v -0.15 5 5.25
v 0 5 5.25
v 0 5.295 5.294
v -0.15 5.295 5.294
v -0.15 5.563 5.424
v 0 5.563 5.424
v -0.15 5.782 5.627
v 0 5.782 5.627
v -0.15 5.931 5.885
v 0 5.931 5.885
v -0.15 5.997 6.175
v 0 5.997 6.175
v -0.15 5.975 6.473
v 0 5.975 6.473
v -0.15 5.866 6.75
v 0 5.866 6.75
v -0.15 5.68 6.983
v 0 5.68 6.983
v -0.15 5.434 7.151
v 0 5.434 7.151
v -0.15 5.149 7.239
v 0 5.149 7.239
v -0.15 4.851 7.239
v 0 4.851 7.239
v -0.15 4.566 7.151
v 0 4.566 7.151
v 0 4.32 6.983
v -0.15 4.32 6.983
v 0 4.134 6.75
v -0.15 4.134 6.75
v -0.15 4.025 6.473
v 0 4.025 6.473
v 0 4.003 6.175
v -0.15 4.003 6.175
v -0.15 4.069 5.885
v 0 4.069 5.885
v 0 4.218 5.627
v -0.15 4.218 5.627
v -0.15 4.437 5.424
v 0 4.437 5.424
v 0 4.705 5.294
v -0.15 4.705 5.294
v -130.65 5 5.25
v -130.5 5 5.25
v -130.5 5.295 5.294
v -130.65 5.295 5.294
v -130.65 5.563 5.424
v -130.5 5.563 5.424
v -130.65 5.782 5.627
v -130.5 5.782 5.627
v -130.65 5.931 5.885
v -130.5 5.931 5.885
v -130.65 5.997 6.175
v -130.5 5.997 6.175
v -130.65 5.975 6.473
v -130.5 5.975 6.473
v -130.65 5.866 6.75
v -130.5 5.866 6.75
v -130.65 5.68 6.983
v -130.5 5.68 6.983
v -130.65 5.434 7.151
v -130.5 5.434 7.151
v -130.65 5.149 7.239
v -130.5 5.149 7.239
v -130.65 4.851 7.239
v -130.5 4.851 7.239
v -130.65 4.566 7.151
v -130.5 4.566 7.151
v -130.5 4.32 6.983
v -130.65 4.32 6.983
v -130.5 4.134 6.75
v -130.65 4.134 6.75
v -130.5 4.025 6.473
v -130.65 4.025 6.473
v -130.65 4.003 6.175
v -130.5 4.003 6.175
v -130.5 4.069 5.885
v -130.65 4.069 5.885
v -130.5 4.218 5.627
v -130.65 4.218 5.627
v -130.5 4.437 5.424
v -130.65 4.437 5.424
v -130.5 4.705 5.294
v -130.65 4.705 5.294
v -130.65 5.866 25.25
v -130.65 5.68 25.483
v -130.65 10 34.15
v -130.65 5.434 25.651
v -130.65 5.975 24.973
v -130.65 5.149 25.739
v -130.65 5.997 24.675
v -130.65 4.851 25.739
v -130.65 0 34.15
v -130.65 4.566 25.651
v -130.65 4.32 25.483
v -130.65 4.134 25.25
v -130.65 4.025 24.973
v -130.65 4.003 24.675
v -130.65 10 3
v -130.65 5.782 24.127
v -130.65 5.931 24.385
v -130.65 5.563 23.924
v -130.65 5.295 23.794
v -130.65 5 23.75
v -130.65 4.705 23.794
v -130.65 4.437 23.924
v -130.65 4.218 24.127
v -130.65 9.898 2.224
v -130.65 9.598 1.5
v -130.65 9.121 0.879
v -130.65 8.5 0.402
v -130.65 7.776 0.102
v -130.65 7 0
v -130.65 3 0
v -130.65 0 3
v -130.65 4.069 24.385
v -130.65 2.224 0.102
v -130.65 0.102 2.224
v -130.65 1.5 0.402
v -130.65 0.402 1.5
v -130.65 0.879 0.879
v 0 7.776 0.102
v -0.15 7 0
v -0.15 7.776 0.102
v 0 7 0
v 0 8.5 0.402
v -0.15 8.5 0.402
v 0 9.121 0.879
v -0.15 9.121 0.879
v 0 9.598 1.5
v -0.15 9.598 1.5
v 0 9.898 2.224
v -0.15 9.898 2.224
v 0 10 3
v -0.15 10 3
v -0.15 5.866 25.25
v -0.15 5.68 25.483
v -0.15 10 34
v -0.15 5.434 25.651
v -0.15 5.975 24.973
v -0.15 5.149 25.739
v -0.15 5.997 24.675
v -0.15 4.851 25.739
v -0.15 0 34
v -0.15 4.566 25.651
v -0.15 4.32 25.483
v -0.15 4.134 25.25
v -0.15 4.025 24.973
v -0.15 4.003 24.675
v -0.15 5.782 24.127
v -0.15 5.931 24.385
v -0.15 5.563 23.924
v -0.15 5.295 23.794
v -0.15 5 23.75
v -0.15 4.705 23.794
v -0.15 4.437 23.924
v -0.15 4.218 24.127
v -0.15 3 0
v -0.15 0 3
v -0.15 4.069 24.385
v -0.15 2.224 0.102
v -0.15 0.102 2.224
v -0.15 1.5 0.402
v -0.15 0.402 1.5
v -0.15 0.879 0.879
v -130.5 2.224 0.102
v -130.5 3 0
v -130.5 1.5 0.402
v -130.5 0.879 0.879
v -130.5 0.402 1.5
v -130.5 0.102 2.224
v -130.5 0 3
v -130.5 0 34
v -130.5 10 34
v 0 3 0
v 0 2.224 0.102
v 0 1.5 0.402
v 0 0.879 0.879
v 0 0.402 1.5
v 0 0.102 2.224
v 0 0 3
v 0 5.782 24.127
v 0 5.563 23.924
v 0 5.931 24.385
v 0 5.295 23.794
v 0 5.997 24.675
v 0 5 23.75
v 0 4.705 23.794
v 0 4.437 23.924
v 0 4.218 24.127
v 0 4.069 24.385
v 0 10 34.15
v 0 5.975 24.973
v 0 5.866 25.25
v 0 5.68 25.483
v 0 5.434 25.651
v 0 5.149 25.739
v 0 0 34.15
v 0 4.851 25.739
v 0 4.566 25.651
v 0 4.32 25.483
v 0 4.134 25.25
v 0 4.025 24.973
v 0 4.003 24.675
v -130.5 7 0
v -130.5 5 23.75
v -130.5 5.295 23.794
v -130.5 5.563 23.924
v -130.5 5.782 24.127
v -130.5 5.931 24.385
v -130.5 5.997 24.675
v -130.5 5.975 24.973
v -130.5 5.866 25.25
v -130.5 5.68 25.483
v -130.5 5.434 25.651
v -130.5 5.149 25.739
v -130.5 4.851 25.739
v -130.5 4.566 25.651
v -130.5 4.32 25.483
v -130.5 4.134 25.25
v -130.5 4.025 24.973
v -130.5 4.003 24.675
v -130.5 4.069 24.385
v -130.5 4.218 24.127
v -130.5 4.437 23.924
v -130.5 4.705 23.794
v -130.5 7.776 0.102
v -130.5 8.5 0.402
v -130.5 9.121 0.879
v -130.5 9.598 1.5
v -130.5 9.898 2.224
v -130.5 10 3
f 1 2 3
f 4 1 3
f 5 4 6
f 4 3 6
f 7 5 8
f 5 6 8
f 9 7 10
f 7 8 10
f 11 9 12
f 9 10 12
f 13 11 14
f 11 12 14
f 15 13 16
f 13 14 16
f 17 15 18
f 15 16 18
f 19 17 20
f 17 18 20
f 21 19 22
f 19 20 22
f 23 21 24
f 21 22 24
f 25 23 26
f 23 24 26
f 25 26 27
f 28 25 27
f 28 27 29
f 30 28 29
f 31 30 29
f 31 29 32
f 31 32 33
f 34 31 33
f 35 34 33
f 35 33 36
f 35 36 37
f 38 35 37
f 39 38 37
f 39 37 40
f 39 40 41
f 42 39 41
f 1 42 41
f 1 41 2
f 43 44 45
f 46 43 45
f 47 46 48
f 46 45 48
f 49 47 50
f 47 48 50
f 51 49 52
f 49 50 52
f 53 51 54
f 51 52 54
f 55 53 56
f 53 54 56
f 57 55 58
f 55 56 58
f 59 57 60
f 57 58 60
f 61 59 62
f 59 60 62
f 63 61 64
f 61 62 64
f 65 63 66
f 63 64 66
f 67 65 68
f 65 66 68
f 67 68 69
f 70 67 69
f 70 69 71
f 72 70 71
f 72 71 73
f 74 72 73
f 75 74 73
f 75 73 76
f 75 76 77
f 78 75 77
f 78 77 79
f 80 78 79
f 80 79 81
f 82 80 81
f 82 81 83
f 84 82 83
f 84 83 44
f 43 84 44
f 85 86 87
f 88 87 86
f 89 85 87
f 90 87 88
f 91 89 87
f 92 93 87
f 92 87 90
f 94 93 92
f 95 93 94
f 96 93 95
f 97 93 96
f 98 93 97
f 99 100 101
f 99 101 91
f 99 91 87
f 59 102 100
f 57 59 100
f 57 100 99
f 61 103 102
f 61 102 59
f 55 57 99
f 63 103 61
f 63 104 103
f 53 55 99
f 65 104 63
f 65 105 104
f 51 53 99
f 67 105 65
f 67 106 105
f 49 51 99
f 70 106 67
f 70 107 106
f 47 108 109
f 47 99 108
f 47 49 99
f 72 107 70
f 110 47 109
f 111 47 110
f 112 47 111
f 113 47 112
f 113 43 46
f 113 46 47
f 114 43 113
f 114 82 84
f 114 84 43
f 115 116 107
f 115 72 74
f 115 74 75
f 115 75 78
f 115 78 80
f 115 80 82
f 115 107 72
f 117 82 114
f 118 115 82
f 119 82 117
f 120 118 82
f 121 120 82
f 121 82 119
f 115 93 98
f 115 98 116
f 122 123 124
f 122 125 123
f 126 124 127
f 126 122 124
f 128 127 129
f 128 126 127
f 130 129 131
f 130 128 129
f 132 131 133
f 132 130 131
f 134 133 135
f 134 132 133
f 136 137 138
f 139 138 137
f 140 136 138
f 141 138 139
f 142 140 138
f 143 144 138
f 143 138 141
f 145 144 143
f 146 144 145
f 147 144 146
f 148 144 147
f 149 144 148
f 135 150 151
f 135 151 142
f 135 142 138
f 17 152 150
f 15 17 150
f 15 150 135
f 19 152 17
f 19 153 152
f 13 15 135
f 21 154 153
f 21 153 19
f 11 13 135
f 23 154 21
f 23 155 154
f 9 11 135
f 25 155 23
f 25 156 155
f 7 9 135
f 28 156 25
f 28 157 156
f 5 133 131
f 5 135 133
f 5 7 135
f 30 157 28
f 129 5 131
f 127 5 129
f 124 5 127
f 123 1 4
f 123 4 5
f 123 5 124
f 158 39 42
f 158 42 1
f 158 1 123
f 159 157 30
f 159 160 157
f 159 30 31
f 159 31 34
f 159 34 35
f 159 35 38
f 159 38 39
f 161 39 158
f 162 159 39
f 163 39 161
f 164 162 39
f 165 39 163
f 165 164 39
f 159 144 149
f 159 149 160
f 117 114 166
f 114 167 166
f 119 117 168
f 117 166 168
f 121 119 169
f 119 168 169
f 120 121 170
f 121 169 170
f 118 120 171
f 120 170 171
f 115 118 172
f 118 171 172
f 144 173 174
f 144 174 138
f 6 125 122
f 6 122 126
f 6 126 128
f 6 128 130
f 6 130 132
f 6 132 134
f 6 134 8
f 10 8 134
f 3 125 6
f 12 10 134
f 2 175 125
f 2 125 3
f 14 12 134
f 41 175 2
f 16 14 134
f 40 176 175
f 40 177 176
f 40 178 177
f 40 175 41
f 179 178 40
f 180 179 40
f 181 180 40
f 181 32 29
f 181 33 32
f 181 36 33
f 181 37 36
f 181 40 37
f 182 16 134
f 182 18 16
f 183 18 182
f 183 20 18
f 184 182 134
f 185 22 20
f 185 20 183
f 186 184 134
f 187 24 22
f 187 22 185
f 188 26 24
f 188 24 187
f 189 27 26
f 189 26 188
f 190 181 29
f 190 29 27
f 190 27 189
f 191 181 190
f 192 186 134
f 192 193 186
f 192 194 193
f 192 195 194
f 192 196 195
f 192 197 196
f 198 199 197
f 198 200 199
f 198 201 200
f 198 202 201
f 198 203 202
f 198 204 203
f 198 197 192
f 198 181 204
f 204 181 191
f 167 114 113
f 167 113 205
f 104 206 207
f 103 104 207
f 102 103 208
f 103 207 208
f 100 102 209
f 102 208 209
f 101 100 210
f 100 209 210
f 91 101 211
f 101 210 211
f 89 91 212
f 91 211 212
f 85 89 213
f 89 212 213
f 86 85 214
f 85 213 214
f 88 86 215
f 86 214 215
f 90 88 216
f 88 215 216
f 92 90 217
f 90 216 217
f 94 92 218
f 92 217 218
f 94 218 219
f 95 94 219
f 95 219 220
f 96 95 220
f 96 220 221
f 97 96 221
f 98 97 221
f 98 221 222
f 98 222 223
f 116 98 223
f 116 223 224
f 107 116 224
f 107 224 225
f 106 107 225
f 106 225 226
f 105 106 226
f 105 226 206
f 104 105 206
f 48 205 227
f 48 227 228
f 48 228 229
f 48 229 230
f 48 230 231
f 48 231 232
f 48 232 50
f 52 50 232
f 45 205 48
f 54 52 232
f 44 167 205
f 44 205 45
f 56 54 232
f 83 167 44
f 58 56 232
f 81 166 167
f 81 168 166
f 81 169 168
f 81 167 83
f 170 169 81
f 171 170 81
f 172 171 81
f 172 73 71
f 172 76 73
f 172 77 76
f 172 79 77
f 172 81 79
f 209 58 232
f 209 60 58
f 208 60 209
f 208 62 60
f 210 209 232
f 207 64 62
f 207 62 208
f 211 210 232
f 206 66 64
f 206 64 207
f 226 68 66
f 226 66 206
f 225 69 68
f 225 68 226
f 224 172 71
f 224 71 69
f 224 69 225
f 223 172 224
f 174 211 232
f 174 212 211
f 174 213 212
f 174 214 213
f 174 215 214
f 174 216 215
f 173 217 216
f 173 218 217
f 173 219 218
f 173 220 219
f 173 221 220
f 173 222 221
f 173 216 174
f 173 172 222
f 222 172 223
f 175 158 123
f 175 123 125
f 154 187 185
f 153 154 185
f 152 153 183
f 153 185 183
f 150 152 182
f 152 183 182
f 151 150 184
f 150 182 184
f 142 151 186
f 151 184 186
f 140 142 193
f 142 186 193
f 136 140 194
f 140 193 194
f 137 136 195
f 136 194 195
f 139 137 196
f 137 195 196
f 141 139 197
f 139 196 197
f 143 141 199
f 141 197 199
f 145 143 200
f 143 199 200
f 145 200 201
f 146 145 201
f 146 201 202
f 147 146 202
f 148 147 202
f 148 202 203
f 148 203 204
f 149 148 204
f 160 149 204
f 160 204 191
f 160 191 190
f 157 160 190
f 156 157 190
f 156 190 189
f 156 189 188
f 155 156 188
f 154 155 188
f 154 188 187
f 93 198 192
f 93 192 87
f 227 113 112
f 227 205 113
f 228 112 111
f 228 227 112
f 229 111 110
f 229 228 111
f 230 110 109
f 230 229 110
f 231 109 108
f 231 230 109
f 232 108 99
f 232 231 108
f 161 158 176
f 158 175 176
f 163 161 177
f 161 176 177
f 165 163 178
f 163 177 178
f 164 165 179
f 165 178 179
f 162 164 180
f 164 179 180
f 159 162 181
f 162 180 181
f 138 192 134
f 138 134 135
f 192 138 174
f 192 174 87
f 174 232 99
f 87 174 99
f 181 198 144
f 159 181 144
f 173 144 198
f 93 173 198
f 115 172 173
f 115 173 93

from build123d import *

# Parameters (mm, degrees)
BOSS_EXTRUDE1_DEPTH = 10
FILLET1_R           = 3
SKETCH2_R           = 1
CUT_EXTRUDE1_DEPTH  = 130.65


with BuildPart() as part:
    # Sketch1 → Boss-Extrude1 (new body)
    with BuildSketch(Plane(origin=(0, 0, 0), x_dir=(1, 0, 0), z_dir=(0, 1, 0))):
        Polygon((0, 0), (0, -34.15), (-130.65, -34.15), (-130.65, 0), (-130.5, 0), (-130.5, -34), (-0.15, -34), (-0.15, 0), align=None)
    extrude(amount=BOSS_EXTRUDE1_DEPTH)

    # Fillet1
    fillet1_edges = [part.edges().sort_by_distance(p)[0] for p in [
        (-0.075, 10, 0),
        (-130.575, 10, 0),
        (-130.575, 0, 0),
        (-0.075, 0, 0),
    ]]
    fillet(fillet1_edges, radius=FILLET1_R)

    # Sketch2 → Cut-Extrude1 (cut)
    with BuildSketch(Plane(origin=(0, 0, 0), x_dir=(0, 0, -1), z_dir=(1, 0, 0))):
        with Locations((-6.25, 5)):
            Circle(SKETCH2_R)
        with Locations((-24.75, 5)):
            Circle(SKETCH2_R)
    extrude(amount=-CUT_EXTRUDE1_DEPTH, mode=Mode.SUBTRACT)


solid = part.part
